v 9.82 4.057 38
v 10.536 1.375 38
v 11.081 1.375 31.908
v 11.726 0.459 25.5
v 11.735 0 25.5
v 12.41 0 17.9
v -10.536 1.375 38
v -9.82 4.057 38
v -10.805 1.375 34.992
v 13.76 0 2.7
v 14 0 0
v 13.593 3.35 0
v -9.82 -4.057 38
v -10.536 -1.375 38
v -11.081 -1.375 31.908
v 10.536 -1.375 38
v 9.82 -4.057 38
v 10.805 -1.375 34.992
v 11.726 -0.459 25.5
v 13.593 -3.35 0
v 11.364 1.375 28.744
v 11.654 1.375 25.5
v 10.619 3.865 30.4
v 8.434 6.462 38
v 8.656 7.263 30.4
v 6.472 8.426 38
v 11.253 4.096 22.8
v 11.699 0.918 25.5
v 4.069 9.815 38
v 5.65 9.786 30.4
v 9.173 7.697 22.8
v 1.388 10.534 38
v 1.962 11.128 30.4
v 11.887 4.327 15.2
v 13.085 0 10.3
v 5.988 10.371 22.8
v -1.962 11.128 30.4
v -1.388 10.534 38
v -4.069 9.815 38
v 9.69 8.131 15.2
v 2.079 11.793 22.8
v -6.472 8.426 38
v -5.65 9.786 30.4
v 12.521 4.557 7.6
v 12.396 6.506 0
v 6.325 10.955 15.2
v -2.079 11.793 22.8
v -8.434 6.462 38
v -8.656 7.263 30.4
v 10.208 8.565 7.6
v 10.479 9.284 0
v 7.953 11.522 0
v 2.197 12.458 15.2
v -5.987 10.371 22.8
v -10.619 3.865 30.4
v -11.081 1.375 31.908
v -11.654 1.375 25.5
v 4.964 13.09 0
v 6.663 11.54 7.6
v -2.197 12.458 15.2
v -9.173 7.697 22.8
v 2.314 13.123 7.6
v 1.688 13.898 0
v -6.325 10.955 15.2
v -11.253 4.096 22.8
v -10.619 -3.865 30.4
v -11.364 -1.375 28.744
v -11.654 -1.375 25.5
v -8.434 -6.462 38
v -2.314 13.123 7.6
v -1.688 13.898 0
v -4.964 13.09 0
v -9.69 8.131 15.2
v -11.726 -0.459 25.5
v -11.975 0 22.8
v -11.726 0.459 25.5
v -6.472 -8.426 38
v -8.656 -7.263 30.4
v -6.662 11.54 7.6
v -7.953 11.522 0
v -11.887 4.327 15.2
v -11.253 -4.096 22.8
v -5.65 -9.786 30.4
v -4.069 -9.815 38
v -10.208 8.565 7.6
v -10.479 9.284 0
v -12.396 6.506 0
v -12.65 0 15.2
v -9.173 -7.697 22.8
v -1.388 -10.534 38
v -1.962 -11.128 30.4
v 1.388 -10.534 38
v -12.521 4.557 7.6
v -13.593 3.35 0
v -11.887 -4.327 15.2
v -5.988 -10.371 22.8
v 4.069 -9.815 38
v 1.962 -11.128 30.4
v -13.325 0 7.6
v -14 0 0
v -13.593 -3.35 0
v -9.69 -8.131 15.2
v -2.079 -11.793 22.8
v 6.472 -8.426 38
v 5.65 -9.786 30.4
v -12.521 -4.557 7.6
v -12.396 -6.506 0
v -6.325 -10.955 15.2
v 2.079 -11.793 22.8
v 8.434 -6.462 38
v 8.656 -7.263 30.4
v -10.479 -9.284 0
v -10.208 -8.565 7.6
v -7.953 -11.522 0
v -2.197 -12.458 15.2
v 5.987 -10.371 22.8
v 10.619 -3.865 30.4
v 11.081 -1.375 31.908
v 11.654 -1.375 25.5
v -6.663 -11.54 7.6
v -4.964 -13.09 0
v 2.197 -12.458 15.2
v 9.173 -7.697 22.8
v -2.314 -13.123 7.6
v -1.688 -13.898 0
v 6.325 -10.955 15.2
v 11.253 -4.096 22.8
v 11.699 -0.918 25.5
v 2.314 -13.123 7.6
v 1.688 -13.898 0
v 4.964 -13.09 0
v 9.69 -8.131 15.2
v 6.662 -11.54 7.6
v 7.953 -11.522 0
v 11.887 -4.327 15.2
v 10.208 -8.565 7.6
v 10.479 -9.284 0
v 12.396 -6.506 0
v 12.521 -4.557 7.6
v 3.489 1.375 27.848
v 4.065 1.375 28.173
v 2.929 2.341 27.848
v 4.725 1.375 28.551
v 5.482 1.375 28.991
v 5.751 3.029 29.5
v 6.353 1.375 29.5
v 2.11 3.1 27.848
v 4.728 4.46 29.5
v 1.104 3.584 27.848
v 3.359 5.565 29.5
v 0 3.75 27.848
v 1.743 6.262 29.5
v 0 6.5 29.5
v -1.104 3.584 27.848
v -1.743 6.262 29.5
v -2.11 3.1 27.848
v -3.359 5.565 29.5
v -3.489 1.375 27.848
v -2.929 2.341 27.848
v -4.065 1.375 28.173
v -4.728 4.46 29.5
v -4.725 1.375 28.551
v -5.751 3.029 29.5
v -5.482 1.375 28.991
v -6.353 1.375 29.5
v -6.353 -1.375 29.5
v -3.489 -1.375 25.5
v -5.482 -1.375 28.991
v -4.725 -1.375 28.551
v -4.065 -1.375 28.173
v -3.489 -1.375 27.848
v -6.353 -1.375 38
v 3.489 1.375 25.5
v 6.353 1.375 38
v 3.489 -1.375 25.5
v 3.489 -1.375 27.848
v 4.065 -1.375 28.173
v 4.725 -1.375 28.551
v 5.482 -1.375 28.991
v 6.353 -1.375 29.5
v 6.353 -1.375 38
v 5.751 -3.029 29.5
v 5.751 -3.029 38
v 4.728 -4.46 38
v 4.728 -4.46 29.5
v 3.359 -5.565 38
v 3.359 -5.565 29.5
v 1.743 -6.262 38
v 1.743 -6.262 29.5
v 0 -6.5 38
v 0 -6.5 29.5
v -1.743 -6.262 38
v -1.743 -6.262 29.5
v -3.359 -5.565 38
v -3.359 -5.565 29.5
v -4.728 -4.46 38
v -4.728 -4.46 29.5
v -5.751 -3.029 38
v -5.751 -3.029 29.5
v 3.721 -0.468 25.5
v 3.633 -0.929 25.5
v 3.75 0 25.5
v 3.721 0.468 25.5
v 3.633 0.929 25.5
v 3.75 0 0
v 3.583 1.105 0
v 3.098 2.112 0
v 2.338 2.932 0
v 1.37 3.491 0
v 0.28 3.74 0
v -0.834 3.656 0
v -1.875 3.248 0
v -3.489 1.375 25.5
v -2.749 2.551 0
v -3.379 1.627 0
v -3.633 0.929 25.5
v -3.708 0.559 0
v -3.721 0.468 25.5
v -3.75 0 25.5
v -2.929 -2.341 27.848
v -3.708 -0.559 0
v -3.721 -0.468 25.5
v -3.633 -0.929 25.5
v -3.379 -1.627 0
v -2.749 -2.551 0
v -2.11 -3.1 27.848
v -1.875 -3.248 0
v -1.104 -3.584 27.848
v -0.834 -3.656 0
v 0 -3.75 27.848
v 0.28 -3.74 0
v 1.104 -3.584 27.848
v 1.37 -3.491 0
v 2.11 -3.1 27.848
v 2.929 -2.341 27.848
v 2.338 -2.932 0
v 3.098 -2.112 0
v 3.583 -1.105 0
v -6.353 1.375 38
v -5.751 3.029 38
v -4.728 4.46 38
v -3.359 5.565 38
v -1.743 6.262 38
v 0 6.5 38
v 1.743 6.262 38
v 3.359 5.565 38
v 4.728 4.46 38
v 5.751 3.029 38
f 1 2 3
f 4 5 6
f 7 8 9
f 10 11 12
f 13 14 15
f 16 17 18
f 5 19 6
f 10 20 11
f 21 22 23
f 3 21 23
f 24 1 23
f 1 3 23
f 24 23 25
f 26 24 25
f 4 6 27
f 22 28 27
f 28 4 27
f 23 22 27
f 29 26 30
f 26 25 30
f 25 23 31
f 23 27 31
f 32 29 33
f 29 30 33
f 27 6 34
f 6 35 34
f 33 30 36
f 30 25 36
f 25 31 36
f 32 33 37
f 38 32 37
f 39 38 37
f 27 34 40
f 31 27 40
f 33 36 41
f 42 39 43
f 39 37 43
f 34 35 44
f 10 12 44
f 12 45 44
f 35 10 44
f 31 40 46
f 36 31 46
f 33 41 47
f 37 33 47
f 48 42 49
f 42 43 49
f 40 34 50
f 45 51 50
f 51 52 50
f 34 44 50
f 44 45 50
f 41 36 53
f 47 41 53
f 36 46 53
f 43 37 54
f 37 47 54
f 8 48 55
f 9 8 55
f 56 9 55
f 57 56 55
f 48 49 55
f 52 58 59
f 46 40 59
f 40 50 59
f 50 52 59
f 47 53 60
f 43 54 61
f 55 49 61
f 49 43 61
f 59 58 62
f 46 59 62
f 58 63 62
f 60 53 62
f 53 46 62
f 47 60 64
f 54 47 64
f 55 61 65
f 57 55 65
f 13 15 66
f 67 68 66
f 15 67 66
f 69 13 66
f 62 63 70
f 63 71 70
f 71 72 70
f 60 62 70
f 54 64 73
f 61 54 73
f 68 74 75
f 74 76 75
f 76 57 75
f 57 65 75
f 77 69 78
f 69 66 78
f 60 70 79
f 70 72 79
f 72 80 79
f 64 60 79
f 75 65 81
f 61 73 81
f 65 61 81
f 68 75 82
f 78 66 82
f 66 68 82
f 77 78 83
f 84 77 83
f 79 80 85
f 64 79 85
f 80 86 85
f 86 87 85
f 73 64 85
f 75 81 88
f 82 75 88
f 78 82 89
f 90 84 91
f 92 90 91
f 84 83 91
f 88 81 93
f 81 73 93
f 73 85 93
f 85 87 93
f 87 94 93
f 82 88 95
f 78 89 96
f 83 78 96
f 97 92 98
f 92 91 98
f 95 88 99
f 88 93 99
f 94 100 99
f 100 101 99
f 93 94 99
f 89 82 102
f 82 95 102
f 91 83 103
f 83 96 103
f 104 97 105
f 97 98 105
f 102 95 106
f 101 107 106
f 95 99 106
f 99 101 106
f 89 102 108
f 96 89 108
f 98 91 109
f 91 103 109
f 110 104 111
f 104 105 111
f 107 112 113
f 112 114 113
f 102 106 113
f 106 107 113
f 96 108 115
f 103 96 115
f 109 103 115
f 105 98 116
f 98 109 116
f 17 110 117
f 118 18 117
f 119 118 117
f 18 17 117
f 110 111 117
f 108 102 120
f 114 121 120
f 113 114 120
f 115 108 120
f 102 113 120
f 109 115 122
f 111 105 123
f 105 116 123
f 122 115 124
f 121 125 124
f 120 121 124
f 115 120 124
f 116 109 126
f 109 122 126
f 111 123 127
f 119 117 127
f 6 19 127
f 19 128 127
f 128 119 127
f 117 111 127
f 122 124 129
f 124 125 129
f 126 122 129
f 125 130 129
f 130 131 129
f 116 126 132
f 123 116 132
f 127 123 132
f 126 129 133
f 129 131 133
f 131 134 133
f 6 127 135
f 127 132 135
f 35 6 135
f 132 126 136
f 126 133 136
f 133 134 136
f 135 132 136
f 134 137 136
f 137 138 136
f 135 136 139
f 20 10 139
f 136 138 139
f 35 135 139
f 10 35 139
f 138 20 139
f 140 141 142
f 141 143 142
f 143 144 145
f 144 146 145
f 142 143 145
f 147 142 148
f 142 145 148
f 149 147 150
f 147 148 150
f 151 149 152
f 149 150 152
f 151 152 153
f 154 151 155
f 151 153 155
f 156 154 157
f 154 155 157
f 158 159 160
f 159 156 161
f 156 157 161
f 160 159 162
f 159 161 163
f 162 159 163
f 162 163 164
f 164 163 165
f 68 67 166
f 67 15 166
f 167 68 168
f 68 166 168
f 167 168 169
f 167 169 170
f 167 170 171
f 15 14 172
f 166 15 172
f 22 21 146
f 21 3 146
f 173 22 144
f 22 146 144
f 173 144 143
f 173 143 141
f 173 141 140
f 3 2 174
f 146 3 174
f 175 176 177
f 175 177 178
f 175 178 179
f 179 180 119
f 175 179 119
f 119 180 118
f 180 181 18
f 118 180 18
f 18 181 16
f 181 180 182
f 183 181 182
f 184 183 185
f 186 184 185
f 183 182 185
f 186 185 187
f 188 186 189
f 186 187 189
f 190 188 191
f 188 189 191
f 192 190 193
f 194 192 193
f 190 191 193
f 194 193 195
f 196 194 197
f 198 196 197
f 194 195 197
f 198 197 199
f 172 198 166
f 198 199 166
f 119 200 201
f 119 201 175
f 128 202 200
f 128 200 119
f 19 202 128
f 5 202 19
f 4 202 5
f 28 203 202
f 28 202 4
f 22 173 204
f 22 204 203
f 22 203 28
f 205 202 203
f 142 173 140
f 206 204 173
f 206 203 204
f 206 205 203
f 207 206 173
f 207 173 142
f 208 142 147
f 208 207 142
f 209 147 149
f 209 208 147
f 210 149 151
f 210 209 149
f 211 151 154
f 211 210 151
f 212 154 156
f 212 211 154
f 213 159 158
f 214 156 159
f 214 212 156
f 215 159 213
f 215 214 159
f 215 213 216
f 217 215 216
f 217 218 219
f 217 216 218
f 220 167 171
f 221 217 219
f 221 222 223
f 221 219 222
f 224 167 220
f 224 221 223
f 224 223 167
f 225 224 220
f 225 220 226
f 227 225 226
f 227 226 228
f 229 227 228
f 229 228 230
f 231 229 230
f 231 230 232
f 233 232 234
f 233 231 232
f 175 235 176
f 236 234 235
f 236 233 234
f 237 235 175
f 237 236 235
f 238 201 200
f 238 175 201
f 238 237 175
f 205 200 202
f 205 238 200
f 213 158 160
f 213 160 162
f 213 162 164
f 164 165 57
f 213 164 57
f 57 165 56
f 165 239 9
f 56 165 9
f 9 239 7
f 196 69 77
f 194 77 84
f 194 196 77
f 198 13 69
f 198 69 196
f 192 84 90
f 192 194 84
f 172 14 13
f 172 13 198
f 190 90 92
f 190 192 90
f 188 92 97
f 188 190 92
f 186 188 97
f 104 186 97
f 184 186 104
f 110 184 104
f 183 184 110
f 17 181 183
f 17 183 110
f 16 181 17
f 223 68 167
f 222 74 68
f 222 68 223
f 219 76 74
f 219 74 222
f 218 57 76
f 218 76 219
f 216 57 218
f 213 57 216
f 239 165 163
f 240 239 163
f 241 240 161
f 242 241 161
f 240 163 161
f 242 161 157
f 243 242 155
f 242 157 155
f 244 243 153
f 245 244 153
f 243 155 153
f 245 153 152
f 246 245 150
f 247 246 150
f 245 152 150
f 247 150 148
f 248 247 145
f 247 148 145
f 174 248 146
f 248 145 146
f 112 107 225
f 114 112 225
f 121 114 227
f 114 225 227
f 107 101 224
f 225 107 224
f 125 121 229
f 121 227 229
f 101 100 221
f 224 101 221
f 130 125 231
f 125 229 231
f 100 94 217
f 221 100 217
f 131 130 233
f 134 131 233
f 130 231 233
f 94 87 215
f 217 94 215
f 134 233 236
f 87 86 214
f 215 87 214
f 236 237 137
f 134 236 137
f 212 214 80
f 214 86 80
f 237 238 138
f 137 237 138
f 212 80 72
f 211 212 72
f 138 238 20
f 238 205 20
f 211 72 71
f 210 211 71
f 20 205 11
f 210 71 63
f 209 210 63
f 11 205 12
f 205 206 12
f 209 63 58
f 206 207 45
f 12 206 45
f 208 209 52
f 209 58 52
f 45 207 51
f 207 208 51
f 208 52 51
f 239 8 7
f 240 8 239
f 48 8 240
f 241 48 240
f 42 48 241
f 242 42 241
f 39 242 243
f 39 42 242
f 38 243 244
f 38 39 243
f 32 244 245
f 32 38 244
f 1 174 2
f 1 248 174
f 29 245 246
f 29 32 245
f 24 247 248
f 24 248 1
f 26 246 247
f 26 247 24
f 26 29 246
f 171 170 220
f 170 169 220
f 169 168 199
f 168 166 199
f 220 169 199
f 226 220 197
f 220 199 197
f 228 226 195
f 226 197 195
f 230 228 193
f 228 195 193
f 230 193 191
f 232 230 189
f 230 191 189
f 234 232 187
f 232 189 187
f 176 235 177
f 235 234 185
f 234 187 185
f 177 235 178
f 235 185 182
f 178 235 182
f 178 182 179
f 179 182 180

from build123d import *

# Parameters (mm, degrees)
F2_R     = 10.625
F0_R     = 14
F4_R     = 3.75
F5_DEPTH = 61.90218
F7_DEPTH = 12.5
F9_D     = 13
F9_DEPTH = 8.5
F9_TIP   = 3.9055940237


with BuildPart() as f3:
    # F2 (on offset) → F3 section 0
    with BuildSketch(Plane.XY.offset(38)):
        Circle(F2_R)
    # F0 (on Top) → F3 section 1
    with BuildSketch(Plane.XY):
        Circle(F0_R)
    loft()

    # F4 (on Top) → F5 (cut)
    with BuildSketch(Plane.XY):
        Circle(F4_R)
    extrude(amount=F5_DEPTH, mode=Mode.SUBTRACT)

    # F6 (on face) → F7 (cut)
    with BuildSketch(Plane.XY.offset(38)):
        with BuildLine():
            Line((-10.5356537529, 1.375), (-16.0871957117, 1.375))
            Line((-16.0871957117, 1.375), (-16.0871957117, 0))
            Line((-16.0871957117, 0), (-10.625, 0))
            ThreePointArc((-10.625, 0), (-10.60263991, 0.6889498806), (-10.5356537529, 1.375))
        make_face()
        with BuildLine():
            Line((-3.4888214342, 1.375), (-10.5356537529, 1.375))
            ThreePointArc((-10.5356537529, 1.375), (-10.60263991, 0.6889498806), (-10.625, 0))
            Line((-10.625, 0), (-3.75, 0))
            ThreePointArc((-3.75, 0), (-3.6841267879, 0.6997926913), (-3.4888214342, 1.375))
        make_face()
        with BuildLine():
            Line((-10.625, 0), (-16.0871957117, 0))
            Line((-16.0871957117, 0), (-16.0871957117, -1.375))
            Line((-16.0871957117, -1.375), (-10.5356537529, -1.375))
            ThreePointArc((-10.5356537529, -1.375), (-10.60263991, -0.6889498806), (-10.625, 0))
        make_face()
        with BuildLine():
            ThreePointArc((10.625, 0), (10.60263991, 0.6889498806), (10.5356537529, 1.375))
            Line((10.5356537529, 1.375), (3.4888214342, 1.375))
            ThreePointArc((3.4888214342, 1.375), (3.6841267879, 0.6997926913), (3.75, 0))
            Line((3.75, 0), (10.625, 0))
        make_face()
        with BuildLine():
            Line((16.6521480927, 1.375), (10.5356537529, 1.375))
            ThreePointArc((10.5356537529, 1.375), (10.60263991, 0.6889498806), (10.625, 0))
            Line((10.625, 0), (16.6521480927, 0))
            Line((16.6521480927, 0), (16.6521480927, 1.375))
        make_face()
        with BuildLine():
            Line((-3.75, 0), (-10.625, 0))
            ThreePointArc((-10.625, 0), (-10.60263991, -0.6889498806), (-10.5356537529, -1.375))
            Line((-10.5356537529, -1.375), (-3.4888214342, -1.375))
            ThreePointArc((-3.4888214342, -1.375), (-3.6841267879, -0.6997926913), (-3.75, 0))
        make_face()
        with BuildLine():
            ThreePointArc((10.5356537529, -1.375), (10.60263991, -0.6889498806), (10.625, 0))
            Line((10.625, 0), (3.75, 0))
            ThreePointArc((3.75, 0), (3.6841267879, -0.6997926913), (3.4888214342, -1.375))
            Line((3.4888214342, -1.375), (10.5356537529, -1.375))
        make_face()
        with BuildLine():
            Line((16.6521480927, 0), (10.625, 0))
            ThreePointArc((10.625, 0), (10.60263991, -0.6889498806), (10.5356537529, -1.375))
            Line((10.5356537529, -1.375), (16.6521480927, -1.375))
            Line((16.6521480927, -1.375), (16.6521480927, 0))
        make_face()
    extrude(amount=-F7_DEPTH, mode=Mode.SUBTRACT)

    # F9
    with Locations(Plane.XY.offset(38)):
        with Locations((0, 0)):
            Hole(F9_D / 2, depth=F9_DEPTH)
            with Locations((0, 0, -(F9_DEPTH + F9_TIP / 2))):  # 118° drill point
                Cone(0, F9_D / 2, F9_TIP, mode=Mode.SUBTRACT)


solid = f3.part
